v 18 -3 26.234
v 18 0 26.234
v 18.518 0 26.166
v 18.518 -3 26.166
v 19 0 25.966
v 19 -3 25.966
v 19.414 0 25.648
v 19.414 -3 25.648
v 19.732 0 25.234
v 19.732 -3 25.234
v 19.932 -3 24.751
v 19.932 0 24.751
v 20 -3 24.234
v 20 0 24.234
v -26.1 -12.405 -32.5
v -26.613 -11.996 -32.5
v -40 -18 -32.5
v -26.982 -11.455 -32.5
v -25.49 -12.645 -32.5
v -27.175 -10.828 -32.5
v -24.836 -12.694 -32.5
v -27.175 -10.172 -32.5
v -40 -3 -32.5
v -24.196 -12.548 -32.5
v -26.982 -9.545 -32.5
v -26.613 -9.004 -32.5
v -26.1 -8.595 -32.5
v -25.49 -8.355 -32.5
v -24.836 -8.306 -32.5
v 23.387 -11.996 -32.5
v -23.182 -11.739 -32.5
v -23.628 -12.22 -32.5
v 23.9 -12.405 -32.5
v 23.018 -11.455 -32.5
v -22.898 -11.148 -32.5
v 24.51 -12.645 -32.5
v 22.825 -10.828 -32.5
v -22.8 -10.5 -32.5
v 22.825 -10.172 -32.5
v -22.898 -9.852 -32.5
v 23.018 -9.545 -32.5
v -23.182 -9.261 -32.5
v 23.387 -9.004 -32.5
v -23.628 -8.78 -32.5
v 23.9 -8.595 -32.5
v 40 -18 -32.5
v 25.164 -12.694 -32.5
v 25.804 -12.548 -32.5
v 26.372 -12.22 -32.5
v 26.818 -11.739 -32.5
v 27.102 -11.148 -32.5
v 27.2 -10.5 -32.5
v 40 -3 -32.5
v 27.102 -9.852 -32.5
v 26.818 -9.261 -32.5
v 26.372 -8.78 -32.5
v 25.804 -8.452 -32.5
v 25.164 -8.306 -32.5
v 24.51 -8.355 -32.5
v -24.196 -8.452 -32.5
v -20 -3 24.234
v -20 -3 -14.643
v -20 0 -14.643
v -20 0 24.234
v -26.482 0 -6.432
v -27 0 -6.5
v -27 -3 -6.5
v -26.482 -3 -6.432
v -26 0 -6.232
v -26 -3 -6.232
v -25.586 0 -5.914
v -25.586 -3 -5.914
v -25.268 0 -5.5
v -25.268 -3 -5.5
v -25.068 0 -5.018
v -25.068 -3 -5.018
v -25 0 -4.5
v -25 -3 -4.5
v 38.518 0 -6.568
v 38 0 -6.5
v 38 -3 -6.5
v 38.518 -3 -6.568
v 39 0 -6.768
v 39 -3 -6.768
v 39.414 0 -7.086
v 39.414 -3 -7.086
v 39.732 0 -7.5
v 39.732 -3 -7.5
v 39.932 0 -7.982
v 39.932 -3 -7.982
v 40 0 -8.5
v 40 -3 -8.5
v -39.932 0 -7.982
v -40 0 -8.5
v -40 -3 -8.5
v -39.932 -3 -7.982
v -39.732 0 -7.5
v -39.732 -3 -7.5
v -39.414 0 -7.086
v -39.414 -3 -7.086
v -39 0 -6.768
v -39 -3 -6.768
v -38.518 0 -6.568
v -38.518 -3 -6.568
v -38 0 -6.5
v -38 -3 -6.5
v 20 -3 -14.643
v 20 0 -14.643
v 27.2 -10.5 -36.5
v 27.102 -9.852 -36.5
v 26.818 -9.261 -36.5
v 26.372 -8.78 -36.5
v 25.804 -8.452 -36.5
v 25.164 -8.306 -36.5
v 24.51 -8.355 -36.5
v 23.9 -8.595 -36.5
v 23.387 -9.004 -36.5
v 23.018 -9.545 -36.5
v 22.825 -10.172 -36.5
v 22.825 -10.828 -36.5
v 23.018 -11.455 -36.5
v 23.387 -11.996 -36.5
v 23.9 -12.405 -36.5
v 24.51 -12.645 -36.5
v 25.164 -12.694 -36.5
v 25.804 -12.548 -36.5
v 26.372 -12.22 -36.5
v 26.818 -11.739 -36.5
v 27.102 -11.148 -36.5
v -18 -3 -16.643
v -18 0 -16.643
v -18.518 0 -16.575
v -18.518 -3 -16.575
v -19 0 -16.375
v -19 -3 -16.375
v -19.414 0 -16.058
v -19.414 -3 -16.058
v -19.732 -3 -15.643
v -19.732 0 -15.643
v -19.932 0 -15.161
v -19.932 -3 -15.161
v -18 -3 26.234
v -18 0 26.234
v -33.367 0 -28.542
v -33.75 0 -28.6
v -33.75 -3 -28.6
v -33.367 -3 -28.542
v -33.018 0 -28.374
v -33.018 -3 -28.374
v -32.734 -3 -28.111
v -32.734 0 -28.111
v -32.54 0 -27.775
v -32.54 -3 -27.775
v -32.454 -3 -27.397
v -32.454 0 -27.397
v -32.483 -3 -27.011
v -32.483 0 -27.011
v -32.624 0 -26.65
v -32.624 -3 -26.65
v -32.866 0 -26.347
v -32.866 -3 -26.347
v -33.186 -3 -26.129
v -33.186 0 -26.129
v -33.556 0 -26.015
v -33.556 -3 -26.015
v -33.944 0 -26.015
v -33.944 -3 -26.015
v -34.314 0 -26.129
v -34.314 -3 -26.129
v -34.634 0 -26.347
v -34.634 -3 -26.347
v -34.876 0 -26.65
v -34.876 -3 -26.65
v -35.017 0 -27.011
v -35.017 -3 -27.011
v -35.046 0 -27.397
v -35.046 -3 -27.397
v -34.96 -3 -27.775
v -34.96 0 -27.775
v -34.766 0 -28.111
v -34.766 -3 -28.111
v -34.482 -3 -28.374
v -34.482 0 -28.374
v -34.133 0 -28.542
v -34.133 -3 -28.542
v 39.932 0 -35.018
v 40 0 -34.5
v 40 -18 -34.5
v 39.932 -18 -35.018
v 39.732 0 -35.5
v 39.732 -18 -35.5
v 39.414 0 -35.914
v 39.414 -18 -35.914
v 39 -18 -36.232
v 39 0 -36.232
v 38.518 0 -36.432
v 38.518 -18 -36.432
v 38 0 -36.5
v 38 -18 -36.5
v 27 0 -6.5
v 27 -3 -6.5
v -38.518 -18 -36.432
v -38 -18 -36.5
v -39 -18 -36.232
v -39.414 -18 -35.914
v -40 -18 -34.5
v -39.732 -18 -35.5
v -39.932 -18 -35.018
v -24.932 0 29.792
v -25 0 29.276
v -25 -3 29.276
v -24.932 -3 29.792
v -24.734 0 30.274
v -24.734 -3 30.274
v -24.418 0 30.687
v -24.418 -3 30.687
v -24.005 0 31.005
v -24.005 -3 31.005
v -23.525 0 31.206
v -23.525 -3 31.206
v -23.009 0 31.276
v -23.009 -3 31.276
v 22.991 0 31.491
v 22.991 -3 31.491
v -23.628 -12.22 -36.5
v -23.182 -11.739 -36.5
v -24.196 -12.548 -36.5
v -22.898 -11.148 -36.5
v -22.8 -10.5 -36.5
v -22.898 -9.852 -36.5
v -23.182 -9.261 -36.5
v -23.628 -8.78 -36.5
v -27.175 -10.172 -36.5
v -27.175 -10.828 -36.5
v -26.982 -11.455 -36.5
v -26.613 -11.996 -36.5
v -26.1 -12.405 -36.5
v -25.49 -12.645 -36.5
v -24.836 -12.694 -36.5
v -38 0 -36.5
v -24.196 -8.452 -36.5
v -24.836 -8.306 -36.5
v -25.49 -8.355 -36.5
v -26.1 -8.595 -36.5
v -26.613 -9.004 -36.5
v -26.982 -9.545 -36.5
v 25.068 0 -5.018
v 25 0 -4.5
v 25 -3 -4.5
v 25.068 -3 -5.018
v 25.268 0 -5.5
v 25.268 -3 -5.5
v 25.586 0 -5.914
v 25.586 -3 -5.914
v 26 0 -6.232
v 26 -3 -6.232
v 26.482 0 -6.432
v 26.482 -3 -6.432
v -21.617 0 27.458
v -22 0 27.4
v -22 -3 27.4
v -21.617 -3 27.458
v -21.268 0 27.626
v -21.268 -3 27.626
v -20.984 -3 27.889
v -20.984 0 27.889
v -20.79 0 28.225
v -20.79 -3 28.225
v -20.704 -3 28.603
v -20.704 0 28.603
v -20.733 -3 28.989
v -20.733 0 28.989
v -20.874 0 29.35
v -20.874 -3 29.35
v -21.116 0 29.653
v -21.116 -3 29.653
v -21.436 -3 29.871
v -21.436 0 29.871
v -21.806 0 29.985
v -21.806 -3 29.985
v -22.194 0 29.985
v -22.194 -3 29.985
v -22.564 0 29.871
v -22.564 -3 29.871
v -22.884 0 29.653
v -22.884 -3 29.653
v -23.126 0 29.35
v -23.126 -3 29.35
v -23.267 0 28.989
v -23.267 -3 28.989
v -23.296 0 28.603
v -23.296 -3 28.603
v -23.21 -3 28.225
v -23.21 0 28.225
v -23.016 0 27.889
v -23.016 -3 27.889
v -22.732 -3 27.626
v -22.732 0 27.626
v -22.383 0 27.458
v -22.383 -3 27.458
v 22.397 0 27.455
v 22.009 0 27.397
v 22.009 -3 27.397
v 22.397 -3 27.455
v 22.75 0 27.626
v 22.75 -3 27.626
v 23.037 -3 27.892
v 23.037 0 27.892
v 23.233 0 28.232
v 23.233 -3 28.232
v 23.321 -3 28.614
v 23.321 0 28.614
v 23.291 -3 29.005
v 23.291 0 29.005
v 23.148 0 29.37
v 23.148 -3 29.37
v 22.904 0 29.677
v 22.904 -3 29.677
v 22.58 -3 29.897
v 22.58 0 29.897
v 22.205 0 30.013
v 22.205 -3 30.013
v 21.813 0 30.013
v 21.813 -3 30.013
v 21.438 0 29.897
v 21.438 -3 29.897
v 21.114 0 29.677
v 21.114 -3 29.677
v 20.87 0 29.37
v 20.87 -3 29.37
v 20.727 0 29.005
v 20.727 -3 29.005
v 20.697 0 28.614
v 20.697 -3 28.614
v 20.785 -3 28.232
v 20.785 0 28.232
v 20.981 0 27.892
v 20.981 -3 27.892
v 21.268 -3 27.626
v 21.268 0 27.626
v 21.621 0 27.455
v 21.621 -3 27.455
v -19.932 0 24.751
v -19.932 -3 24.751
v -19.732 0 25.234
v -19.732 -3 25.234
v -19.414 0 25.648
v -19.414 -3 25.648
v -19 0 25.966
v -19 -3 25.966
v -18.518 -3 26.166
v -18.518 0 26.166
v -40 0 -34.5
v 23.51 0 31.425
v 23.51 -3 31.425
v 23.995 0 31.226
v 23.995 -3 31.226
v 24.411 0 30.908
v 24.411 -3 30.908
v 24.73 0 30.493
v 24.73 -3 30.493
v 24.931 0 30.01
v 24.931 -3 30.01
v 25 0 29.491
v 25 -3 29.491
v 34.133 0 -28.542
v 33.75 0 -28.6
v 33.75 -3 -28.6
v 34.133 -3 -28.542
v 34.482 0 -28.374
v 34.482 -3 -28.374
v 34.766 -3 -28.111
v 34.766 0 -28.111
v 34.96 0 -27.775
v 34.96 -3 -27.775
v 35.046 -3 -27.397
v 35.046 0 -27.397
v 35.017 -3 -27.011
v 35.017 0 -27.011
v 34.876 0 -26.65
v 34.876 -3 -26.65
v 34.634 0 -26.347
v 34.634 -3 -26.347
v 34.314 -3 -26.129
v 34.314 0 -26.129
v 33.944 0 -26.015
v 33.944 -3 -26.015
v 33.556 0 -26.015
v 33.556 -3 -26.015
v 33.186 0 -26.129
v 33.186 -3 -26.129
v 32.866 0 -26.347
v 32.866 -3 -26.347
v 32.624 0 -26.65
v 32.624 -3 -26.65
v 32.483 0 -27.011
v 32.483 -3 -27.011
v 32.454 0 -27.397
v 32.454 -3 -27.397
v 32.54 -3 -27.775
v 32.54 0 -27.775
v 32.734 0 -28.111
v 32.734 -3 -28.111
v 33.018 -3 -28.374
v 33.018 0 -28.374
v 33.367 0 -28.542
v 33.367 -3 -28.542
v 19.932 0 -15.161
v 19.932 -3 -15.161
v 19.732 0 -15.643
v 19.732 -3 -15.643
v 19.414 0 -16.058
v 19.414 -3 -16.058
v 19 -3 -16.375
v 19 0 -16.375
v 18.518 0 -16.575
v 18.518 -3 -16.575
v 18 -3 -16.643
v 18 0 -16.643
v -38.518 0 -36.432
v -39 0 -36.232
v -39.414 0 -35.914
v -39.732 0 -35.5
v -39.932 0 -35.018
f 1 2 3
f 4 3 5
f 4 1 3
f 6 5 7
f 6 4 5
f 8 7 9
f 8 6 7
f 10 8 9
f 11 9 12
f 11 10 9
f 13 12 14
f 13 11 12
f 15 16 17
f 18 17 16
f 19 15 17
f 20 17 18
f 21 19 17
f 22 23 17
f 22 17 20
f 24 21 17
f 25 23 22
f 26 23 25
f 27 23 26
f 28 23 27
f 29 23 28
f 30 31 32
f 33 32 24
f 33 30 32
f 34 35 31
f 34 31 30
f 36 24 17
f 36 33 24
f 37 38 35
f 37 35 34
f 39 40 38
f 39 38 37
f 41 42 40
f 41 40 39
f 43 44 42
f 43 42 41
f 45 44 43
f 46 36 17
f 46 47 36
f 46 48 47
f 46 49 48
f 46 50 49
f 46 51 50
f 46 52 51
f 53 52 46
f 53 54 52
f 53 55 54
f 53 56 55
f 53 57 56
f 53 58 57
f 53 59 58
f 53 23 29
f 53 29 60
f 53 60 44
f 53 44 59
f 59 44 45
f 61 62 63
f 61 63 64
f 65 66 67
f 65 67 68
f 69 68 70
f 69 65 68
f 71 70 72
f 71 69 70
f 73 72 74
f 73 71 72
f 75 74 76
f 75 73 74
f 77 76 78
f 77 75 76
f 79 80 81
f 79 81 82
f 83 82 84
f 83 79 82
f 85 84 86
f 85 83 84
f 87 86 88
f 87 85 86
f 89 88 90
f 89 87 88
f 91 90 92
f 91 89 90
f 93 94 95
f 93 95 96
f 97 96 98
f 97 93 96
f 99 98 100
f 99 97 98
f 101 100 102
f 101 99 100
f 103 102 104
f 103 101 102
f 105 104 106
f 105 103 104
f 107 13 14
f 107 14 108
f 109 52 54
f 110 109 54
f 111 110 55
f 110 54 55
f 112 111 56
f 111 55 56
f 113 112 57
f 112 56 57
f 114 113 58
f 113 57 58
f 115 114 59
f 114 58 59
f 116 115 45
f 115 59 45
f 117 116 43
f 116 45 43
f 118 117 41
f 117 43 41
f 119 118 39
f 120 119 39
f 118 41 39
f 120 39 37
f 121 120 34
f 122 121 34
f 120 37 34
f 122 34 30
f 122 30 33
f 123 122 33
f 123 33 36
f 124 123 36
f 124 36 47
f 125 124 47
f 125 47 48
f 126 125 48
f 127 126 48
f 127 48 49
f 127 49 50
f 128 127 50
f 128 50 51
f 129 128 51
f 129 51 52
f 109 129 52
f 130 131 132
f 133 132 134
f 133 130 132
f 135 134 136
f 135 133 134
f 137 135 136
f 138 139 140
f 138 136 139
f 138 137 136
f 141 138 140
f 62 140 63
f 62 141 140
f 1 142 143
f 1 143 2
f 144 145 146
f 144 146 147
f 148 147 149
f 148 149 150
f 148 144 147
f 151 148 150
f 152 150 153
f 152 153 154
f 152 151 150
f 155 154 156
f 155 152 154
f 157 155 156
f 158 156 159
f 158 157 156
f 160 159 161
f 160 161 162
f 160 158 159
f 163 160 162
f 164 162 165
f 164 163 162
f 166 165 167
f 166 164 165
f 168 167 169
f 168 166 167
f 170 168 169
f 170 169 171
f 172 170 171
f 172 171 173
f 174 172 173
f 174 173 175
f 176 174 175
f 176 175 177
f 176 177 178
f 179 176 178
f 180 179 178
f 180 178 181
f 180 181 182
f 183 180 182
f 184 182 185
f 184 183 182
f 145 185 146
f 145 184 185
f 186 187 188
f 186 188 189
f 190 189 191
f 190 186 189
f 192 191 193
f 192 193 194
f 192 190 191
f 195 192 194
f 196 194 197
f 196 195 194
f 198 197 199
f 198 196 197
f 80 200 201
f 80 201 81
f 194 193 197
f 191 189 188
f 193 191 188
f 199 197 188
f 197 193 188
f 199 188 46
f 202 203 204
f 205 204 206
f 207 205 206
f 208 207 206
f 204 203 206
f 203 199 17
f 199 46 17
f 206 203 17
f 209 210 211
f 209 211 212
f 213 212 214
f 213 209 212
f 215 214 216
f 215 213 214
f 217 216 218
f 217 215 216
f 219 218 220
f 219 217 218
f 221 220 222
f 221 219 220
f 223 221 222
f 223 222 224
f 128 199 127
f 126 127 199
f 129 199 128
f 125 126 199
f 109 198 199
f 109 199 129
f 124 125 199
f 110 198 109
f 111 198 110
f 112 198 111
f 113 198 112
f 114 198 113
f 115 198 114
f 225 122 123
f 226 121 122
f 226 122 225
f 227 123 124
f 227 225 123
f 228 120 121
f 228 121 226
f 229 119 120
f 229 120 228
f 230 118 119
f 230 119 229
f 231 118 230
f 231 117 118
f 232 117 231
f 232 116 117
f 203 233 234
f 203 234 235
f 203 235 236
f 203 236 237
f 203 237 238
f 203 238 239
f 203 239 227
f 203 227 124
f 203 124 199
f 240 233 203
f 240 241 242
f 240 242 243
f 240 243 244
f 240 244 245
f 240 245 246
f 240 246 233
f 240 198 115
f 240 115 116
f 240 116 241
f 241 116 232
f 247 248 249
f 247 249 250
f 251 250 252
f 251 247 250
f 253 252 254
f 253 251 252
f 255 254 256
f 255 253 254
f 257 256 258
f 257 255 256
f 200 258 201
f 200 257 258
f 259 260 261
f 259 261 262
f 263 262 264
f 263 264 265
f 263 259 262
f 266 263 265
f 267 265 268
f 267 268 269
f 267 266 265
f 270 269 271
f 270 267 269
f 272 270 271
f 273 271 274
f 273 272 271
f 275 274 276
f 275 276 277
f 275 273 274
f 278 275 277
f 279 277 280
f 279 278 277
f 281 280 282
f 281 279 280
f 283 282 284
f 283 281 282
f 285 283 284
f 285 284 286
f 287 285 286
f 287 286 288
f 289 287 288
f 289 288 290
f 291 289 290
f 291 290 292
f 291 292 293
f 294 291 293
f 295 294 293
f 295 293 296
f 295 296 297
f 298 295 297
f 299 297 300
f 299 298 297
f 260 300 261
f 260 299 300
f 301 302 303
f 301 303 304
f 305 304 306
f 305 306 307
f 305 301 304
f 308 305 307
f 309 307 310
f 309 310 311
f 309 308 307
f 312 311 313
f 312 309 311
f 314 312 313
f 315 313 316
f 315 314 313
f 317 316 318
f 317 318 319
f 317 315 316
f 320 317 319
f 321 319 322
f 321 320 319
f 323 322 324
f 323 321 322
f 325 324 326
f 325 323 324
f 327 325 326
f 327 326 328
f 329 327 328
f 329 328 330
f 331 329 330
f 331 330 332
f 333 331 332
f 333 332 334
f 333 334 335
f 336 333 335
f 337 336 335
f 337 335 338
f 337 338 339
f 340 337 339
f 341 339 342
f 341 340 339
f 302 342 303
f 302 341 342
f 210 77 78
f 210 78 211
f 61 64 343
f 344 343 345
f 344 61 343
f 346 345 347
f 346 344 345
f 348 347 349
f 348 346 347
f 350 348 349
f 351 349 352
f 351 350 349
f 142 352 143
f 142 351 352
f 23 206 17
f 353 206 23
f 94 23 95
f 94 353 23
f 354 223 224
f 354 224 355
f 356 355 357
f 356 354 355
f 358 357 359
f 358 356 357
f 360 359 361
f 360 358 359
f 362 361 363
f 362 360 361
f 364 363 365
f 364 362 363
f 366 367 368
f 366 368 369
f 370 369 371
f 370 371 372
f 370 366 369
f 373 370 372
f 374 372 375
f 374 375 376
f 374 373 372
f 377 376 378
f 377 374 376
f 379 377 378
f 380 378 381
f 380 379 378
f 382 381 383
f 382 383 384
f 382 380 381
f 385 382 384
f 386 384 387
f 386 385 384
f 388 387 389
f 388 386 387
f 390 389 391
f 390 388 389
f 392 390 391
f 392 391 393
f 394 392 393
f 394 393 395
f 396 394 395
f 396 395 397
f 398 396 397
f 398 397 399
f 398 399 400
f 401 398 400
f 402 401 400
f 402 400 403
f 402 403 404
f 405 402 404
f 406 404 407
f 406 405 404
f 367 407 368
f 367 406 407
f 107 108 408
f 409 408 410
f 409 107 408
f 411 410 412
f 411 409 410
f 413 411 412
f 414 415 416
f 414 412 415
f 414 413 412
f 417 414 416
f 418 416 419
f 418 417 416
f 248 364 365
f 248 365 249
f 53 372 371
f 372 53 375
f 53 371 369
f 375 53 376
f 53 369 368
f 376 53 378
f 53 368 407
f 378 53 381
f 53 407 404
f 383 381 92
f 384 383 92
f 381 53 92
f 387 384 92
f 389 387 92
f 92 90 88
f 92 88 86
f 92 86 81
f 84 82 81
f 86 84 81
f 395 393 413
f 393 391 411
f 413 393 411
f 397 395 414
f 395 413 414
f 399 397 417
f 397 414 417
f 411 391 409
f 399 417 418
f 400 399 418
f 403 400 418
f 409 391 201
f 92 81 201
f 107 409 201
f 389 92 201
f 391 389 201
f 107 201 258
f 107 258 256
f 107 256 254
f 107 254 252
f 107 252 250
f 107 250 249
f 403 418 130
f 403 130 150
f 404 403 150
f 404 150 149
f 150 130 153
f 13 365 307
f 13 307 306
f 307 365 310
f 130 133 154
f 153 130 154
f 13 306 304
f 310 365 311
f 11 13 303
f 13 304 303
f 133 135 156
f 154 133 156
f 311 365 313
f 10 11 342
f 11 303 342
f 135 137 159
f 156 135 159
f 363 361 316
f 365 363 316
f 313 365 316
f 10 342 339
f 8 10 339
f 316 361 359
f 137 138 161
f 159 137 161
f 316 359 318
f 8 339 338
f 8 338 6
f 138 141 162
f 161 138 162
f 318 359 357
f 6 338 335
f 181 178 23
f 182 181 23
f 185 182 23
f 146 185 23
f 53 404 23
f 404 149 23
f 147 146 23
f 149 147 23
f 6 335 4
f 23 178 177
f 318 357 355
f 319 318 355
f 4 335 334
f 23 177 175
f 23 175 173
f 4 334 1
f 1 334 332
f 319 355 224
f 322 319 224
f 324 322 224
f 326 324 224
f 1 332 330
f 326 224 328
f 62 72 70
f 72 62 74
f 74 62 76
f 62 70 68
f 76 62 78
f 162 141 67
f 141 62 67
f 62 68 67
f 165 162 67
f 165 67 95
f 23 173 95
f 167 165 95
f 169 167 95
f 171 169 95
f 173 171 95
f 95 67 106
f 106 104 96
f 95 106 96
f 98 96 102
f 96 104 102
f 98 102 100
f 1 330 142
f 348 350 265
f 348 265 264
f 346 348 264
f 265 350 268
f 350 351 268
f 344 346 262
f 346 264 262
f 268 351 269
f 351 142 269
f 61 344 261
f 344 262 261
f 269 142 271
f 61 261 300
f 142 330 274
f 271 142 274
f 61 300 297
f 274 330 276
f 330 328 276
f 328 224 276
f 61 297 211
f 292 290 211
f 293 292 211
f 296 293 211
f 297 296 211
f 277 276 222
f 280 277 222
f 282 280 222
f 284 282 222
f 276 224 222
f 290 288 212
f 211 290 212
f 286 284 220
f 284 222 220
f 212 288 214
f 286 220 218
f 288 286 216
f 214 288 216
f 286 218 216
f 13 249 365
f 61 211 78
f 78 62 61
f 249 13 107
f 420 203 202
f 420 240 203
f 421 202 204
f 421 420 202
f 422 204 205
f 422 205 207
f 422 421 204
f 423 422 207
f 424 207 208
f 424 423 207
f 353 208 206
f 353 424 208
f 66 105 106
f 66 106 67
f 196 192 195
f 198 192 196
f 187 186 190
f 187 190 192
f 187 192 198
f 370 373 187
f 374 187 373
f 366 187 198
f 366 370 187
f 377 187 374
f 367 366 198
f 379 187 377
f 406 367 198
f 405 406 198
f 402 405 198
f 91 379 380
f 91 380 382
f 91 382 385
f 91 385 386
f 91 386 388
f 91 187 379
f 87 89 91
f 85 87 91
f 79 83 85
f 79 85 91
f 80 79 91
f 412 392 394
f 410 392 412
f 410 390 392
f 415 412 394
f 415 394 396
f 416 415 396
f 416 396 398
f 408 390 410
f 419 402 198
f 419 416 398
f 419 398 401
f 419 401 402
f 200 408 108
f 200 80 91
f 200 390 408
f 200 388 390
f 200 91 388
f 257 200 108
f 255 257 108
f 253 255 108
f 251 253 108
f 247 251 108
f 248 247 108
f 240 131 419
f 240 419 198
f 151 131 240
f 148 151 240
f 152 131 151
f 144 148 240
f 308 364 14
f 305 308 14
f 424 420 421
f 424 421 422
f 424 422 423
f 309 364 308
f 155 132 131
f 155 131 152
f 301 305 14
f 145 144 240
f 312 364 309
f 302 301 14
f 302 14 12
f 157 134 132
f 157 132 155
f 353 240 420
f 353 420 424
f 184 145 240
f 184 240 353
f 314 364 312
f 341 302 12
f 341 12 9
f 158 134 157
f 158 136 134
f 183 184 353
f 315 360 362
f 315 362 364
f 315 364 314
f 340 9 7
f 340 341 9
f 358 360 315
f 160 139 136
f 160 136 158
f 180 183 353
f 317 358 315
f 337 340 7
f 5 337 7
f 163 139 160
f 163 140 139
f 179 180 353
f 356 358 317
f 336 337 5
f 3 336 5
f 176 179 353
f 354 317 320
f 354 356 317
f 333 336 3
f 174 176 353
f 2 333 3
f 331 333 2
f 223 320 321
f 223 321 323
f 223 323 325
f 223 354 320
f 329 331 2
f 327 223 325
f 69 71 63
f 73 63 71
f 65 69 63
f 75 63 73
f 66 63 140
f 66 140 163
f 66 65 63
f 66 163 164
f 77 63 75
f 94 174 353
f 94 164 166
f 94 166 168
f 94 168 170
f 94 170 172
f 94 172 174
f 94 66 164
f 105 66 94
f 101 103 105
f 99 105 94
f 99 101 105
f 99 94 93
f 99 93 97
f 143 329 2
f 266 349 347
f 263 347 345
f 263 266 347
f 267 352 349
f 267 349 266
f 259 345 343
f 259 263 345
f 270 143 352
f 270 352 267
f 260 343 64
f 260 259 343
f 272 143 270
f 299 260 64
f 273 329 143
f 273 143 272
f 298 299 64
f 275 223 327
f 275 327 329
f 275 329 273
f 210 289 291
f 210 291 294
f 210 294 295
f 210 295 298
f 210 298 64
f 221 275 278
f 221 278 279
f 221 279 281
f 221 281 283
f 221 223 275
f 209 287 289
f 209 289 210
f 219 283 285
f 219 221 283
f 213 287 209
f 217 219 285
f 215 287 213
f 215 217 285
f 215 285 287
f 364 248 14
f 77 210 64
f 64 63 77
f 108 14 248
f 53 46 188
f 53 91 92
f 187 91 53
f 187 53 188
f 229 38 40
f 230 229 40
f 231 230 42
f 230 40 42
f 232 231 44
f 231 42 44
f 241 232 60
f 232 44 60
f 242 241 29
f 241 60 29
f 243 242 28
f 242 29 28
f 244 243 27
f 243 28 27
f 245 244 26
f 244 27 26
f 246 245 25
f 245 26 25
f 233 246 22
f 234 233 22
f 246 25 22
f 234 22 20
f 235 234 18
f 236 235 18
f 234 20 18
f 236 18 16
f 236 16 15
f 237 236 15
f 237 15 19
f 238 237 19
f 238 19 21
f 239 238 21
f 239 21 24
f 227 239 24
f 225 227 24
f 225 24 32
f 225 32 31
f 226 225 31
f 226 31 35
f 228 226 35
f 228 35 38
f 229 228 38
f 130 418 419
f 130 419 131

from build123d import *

# Parameters (mm, degrees)
SKETCH2_R           = 1.315325132
SKETCH2_R_2         = 1.3
BOSS_EXTRUDE1_DEPTH = 3
CUT_EXTRUDE1_DEPTH  = 10
BOSS_EXTRUDE3_DEPTH = 15
SKETCH6_R           = 2.2
CUT_EXTRUDE2_DEPTH  = 10


with BuildPart() as part:
    # Sketch2 → Boss-Extrude1 (new body)
    with BuildSketch(Plane.XZ):
        with BuildLine():
            Line((-23.009319596, 31.276283835), (22.990680404, 31.490636875))
            ThreePointArc((22.990680404, 31.490636875), (24.41091474, 30.908163296), (25, 29.490658589))
            Line((25, 29.490658589), (25, -4.5))
            ThreePointArc((25, -4.5), (25.585786438, -5.914213562), (27, -6.5))
            Line((27, -6.5), (38, -6.5))
            ThreePointArc((38, -6.5), (39.414213562, -7.085786438), (40, -8.5))
            Line((40, -8.5), (40, -34.5))
            ThreePointArc((40, -34.5), (39.414213562, -35.914213562), (38, -36.5))
            Line((38, -36.5), (-38, -36.5))
            ThreePointArc((-38, -36.5), (-39.414213562, -35.914213562), (-40, -34.5))
            Line((-40, -34.5), (-40, -8.5))
            ThreePointArc((-40, -8.5), (-39.414213562, -7.085786438), (-38, -6.5))
            Line((-38, -6.5), (-27, -6.5))
            ThreePointArc((-27, -6.5), (-25.585786438, -5.914213562), (-25, -4.5))
            Line((-25, -4.5), (-25, 29.276305549))
            ThreePointArc((-25, 29.276305549), (-24.417504708, 30.687220289), (-23.009319596, 31.276283835))
        make_face()
        with Locations(Location((22.009080877, 28.712344932, 0), (0, 0, 270))):
            Circle(SKETCH2_R, mode=Mode.SUBTRACT)
        with Locations(Location((-22, 28.7, 0), (0, 0, 270))):
            Circle(SKETCH2_R_2, mode=Mode.SUBTRACT)
        with Locations(Location((-33.75, -27.3, 0), (0, 0, 270))):
            Circle(SKETCH2_R_2, mode=Mode.SUBTRACT)
        with Locations(Location((33.75, -27.3, 0), (0, 0, 270))):
            Circle(SKETCH2_R_2, mode=Mode.SUBTRACT)
    extrude(amount=BOSS_EXTRUDE1_DEPTH)

    # Sketch3 → Cut-Extrude1 (cut)
    with BuildSketch(Plane.XZ.offset(3)):
        with BuildLine():
            Line((-18, 26.233664787), (18, 26.233664787))
            ThreePointArc((18, 26.233664787), (19.414213562, 25.64787835), (20, 24.233664787))
            Line((20, 24.233664787), (20, -14.643421245))
            ThreePointArc((20, -14.643421245), (19.414213562, -16.057634807), (18, -16.643421245))
            Line((18, -16.643421245), (-18, -16.643421245))
            ThreePointArc((-18, -16.643421245), (-19.414213562, -16.057634807), (-20, -14.643421245))
            Line((-20, -14.643421245), (-20, 24.233664787))
            ThreePointArc((-20, 24.233664787), (-19.414213562, 25.64787835), (-18, 26.233664787))
        make_face()
    extrude(amount=-CUT_EXTRUDE1_DEPTH, mode=Mode.SUBTRACT)

    # Sketch5 → Boss-Extrude3 (add)
    with BuildSketch(Plane.XZ.offset(3)):
        with BuildLine():
            Line((-40, -32.5), (40, -32.5))
            Line((40, -32.5), (40, -34.5))
            ThreePointArc((40, -34.5), (39.414213562, -35.914213562), (38, -36.5))
            Line((38, -36.5), (-38, -36.5))
            ThreePointArc((-38, -36.5), (-39.414213562, -35.914213562), (-40, -34.5))
            Line((-40, -34.5), (-40, -32.5))
        make_face()
    extrude(amount=BOSS_EXTRUDE3_DEPTH)

    # Sketch6 → Cut-Extrude2 (cut)
    with BuildSketch(Plane.XY.offset(-32.5)):
        with Locations((-25, -10.5)):
            Circle(SKETCH6_R)
        with Locations((25, -10.5)):
            Circle(SKETCH6_R)
    extrude(amount=-CUT_EXTRUDE2_DEPTH, mode=Mode.SUBTRACT)


solid = part.part
